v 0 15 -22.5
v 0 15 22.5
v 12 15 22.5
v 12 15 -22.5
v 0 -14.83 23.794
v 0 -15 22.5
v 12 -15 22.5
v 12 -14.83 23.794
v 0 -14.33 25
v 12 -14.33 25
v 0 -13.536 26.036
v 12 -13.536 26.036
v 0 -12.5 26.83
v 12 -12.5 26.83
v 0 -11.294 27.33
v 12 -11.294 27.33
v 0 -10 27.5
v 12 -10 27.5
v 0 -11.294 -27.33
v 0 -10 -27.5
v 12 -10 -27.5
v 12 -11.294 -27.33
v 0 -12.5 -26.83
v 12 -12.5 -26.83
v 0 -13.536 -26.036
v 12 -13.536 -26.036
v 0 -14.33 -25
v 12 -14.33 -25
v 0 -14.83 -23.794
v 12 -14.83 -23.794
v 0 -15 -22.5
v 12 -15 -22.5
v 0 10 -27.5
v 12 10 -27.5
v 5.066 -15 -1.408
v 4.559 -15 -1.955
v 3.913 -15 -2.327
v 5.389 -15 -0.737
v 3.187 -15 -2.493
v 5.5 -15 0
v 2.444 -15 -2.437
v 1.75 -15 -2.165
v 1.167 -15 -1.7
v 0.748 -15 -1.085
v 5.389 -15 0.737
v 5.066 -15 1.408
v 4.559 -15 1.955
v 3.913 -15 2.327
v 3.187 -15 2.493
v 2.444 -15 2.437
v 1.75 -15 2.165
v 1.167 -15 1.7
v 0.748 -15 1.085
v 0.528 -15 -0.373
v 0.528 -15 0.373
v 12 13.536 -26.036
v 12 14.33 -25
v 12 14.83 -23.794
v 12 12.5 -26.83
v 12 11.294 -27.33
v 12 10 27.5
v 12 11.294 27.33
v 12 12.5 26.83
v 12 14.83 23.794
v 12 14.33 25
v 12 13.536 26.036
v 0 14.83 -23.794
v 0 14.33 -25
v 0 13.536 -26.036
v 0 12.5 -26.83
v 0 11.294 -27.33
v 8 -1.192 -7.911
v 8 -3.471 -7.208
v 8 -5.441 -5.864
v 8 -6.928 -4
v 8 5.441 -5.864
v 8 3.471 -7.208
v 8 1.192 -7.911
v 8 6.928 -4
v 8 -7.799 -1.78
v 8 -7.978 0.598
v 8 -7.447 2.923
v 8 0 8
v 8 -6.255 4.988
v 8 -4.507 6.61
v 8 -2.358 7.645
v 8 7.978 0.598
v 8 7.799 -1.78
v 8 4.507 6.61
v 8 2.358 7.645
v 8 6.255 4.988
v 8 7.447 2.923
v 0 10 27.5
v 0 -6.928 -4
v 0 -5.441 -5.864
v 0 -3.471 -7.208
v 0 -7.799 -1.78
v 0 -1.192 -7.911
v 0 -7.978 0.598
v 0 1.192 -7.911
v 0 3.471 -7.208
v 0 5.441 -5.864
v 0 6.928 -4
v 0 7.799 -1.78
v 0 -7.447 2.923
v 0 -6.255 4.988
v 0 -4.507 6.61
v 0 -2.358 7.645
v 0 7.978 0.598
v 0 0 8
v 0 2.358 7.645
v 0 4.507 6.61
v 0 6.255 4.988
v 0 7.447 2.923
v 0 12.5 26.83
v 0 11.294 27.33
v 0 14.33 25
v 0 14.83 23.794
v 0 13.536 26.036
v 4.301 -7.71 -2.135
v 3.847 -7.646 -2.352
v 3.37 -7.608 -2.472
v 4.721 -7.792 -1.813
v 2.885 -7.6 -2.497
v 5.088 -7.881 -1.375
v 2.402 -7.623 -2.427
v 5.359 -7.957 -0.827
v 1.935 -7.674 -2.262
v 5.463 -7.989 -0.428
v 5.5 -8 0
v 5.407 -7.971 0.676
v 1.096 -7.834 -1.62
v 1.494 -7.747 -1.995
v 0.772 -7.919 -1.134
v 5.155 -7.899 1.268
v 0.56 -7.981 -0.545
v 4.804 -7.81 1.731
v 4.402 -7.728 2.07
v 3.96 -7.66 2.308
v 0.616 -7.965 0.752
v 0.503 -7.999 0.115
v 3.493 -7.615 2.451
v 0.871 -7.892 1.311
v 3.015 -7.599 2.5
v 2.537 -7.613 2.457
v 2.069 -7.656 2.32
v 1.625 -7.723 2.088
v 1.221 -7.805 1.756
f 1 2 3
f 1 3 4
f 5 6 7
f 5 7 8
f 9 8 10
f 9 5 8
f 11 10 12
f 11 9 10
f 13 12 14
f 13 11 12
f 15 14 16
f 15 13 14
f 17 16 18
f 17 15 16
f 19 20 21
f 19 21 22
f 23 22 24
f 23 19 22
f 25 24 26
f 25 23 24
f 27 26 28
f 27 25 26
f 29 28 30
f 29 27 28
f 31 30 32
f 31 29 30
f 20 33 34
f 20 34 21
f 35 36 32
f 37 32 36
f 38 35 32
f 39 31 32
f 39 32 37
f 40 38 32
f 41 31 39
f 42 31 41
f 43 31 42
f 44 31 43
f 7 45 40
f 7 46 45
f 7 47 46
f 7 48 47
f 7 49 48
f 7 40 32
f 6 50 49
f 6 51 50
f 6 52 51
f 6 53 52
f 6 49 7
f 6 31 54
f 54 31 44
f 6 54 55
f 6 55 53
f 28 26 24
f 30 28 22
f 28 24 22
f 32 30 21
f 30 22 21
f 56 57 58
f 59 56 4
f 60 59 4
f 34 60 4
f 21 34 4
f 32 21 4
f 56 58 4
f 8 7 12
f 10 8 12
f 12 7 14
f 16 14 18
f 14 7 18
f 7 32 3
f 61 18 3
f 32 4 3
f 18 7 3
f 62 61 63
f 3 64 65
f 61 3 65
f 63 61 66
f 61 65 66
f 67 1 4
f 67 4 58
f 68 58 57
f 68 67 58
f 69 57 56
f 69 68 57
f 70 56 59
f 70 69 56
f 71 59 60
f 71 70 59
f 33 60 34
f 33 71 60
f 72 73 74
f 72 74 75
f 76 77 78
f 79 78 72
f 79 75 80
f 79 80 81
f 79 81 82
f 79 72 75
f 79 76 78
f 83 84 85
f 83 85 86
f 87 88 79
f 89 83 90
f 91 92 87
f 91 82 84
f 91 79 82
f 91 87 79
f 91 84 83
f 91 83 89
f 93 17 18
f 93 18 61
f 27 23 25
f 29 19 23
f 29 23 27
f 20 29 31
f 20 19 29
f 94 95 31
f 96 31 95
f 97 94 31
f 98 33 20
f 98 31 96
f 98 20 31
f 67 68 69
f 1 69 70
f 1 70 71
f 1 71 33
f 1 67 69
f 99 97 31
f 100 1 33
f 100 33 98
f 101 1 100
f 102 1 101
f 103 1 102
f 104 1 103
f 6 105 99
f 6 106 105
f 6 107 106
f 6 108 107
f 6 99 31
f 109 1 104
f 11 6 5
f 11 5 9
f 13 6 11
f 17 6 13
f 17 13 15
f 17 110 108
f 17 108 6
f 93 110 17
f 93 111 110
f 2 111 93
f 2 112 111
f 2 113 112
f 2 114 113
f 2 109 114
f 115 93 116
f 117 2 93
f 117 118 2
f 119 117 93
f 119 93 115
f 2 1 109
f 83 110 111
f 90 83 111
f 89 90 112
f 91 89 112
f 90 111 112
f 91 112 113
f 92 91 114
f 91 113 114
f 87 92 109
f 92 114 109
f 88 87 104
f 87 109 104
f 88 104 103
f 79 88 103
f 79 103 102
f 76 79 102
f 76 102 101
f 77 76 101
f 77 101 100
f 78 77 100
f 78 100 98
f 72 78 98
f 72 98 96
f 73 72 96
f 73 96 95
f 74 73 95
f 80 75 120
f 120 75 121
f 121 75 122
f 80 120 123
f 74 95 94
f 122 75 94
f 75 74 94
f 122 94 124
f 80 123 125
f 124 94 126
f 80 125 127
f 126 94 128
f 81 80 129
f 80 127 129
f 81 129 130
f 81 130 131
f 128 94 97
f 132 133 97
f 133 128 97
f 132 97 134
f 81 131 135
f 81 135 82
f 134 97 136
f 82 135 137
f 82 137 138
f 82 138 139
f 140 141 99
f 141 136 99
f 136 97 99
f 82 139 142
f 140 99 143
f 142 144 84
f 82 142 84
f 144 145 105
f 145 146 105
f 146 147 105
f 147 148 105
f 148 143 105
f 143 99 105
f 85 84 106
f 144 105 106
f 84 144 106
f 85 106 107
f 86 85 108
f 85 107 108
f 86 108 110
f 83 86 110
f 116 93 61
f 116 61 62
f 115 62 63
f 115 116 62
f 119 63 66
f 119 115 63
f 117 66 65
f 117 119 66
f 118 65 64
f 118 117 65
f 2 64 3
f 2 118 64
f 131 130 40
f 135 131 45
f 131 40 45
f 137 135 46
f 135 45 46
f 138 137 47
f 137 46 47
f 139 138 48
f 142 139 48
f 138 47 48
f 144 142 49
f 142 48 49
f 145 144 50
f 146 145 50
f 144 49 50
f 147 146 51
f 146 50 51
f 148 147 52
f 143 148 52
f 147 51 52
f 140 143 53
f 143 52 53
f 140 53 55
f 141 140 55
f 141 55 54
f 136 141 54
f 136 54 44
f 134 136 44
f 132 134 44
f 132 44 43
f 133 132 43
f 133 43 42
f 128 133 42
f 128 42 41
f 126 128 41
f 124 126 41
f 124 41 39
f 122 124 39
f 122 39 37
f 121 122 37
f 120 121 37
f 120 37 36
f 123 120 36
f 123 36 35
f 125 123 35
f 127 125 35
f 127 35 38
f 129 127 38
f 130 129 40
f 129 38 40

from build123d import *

# Parameters (mm, degrees)
EXTRUDE_1_DEPTH     = 12
SKETCH_2_R          = 8
CUT_EXTRUDE_1_DEPTH = 8
SKETCH_3_R          = 2.5
CUT_EXTRUDE_2_DEPTH = 10


with BuildPart() as part:
    # 草图1 → 凸台-拉伸1 (new body)
    with BuildSketch(Plane(origin=(0, 0, 0), x_dir=(0, 0, -1), z_dir=(1, 0, 0))):
        with BuildLine():
            Line((-22.5, 15), (22.5, 15))
            ThreePointArc((22.5, 15), (26.035533906, 13.535533906), (27.5, 10))
            Line((27.5, 10), (27.5, -10))
            ThreePointArc((27.5, -10), (26.035533906, -13.535533906), (22.5, -15))
            Line((22.5, -15), (-22.5, -15))
            ThreePointArc((-22.5, -15), (-26.035533906, -13.535533906), (-27.5, -10))
            Line((-27.5, -10), (-27.5, 10))
            ThreePointArc((-27.5, 10), (-26.035533906, 13.535533906), (-22.5, 15))
        make_face()
    extrude(amount=EXTRUDE_1_DEPTH)

    # 草图2 → 切除-拉伸1 (cut)
    with BuildSketch(Plane.ZY):
        Circle(SKETCH_2_R)
    extrude(amount=-CUT_EXTRUDE_1_DEPTH, mode=Mode.SUBTRACT)

    # 草图3 → 切除-拉伸2 (cut)
    with BuildSketch(Plane.XZ.offset(15)):
        with Locations((3, 0)):
            Circle(SKETCH_3_R)
    extrude(amount=-CUT_EXTRUDE_2_DEPTH, mode=Mode.SUBTRACT)


solid = part.part
